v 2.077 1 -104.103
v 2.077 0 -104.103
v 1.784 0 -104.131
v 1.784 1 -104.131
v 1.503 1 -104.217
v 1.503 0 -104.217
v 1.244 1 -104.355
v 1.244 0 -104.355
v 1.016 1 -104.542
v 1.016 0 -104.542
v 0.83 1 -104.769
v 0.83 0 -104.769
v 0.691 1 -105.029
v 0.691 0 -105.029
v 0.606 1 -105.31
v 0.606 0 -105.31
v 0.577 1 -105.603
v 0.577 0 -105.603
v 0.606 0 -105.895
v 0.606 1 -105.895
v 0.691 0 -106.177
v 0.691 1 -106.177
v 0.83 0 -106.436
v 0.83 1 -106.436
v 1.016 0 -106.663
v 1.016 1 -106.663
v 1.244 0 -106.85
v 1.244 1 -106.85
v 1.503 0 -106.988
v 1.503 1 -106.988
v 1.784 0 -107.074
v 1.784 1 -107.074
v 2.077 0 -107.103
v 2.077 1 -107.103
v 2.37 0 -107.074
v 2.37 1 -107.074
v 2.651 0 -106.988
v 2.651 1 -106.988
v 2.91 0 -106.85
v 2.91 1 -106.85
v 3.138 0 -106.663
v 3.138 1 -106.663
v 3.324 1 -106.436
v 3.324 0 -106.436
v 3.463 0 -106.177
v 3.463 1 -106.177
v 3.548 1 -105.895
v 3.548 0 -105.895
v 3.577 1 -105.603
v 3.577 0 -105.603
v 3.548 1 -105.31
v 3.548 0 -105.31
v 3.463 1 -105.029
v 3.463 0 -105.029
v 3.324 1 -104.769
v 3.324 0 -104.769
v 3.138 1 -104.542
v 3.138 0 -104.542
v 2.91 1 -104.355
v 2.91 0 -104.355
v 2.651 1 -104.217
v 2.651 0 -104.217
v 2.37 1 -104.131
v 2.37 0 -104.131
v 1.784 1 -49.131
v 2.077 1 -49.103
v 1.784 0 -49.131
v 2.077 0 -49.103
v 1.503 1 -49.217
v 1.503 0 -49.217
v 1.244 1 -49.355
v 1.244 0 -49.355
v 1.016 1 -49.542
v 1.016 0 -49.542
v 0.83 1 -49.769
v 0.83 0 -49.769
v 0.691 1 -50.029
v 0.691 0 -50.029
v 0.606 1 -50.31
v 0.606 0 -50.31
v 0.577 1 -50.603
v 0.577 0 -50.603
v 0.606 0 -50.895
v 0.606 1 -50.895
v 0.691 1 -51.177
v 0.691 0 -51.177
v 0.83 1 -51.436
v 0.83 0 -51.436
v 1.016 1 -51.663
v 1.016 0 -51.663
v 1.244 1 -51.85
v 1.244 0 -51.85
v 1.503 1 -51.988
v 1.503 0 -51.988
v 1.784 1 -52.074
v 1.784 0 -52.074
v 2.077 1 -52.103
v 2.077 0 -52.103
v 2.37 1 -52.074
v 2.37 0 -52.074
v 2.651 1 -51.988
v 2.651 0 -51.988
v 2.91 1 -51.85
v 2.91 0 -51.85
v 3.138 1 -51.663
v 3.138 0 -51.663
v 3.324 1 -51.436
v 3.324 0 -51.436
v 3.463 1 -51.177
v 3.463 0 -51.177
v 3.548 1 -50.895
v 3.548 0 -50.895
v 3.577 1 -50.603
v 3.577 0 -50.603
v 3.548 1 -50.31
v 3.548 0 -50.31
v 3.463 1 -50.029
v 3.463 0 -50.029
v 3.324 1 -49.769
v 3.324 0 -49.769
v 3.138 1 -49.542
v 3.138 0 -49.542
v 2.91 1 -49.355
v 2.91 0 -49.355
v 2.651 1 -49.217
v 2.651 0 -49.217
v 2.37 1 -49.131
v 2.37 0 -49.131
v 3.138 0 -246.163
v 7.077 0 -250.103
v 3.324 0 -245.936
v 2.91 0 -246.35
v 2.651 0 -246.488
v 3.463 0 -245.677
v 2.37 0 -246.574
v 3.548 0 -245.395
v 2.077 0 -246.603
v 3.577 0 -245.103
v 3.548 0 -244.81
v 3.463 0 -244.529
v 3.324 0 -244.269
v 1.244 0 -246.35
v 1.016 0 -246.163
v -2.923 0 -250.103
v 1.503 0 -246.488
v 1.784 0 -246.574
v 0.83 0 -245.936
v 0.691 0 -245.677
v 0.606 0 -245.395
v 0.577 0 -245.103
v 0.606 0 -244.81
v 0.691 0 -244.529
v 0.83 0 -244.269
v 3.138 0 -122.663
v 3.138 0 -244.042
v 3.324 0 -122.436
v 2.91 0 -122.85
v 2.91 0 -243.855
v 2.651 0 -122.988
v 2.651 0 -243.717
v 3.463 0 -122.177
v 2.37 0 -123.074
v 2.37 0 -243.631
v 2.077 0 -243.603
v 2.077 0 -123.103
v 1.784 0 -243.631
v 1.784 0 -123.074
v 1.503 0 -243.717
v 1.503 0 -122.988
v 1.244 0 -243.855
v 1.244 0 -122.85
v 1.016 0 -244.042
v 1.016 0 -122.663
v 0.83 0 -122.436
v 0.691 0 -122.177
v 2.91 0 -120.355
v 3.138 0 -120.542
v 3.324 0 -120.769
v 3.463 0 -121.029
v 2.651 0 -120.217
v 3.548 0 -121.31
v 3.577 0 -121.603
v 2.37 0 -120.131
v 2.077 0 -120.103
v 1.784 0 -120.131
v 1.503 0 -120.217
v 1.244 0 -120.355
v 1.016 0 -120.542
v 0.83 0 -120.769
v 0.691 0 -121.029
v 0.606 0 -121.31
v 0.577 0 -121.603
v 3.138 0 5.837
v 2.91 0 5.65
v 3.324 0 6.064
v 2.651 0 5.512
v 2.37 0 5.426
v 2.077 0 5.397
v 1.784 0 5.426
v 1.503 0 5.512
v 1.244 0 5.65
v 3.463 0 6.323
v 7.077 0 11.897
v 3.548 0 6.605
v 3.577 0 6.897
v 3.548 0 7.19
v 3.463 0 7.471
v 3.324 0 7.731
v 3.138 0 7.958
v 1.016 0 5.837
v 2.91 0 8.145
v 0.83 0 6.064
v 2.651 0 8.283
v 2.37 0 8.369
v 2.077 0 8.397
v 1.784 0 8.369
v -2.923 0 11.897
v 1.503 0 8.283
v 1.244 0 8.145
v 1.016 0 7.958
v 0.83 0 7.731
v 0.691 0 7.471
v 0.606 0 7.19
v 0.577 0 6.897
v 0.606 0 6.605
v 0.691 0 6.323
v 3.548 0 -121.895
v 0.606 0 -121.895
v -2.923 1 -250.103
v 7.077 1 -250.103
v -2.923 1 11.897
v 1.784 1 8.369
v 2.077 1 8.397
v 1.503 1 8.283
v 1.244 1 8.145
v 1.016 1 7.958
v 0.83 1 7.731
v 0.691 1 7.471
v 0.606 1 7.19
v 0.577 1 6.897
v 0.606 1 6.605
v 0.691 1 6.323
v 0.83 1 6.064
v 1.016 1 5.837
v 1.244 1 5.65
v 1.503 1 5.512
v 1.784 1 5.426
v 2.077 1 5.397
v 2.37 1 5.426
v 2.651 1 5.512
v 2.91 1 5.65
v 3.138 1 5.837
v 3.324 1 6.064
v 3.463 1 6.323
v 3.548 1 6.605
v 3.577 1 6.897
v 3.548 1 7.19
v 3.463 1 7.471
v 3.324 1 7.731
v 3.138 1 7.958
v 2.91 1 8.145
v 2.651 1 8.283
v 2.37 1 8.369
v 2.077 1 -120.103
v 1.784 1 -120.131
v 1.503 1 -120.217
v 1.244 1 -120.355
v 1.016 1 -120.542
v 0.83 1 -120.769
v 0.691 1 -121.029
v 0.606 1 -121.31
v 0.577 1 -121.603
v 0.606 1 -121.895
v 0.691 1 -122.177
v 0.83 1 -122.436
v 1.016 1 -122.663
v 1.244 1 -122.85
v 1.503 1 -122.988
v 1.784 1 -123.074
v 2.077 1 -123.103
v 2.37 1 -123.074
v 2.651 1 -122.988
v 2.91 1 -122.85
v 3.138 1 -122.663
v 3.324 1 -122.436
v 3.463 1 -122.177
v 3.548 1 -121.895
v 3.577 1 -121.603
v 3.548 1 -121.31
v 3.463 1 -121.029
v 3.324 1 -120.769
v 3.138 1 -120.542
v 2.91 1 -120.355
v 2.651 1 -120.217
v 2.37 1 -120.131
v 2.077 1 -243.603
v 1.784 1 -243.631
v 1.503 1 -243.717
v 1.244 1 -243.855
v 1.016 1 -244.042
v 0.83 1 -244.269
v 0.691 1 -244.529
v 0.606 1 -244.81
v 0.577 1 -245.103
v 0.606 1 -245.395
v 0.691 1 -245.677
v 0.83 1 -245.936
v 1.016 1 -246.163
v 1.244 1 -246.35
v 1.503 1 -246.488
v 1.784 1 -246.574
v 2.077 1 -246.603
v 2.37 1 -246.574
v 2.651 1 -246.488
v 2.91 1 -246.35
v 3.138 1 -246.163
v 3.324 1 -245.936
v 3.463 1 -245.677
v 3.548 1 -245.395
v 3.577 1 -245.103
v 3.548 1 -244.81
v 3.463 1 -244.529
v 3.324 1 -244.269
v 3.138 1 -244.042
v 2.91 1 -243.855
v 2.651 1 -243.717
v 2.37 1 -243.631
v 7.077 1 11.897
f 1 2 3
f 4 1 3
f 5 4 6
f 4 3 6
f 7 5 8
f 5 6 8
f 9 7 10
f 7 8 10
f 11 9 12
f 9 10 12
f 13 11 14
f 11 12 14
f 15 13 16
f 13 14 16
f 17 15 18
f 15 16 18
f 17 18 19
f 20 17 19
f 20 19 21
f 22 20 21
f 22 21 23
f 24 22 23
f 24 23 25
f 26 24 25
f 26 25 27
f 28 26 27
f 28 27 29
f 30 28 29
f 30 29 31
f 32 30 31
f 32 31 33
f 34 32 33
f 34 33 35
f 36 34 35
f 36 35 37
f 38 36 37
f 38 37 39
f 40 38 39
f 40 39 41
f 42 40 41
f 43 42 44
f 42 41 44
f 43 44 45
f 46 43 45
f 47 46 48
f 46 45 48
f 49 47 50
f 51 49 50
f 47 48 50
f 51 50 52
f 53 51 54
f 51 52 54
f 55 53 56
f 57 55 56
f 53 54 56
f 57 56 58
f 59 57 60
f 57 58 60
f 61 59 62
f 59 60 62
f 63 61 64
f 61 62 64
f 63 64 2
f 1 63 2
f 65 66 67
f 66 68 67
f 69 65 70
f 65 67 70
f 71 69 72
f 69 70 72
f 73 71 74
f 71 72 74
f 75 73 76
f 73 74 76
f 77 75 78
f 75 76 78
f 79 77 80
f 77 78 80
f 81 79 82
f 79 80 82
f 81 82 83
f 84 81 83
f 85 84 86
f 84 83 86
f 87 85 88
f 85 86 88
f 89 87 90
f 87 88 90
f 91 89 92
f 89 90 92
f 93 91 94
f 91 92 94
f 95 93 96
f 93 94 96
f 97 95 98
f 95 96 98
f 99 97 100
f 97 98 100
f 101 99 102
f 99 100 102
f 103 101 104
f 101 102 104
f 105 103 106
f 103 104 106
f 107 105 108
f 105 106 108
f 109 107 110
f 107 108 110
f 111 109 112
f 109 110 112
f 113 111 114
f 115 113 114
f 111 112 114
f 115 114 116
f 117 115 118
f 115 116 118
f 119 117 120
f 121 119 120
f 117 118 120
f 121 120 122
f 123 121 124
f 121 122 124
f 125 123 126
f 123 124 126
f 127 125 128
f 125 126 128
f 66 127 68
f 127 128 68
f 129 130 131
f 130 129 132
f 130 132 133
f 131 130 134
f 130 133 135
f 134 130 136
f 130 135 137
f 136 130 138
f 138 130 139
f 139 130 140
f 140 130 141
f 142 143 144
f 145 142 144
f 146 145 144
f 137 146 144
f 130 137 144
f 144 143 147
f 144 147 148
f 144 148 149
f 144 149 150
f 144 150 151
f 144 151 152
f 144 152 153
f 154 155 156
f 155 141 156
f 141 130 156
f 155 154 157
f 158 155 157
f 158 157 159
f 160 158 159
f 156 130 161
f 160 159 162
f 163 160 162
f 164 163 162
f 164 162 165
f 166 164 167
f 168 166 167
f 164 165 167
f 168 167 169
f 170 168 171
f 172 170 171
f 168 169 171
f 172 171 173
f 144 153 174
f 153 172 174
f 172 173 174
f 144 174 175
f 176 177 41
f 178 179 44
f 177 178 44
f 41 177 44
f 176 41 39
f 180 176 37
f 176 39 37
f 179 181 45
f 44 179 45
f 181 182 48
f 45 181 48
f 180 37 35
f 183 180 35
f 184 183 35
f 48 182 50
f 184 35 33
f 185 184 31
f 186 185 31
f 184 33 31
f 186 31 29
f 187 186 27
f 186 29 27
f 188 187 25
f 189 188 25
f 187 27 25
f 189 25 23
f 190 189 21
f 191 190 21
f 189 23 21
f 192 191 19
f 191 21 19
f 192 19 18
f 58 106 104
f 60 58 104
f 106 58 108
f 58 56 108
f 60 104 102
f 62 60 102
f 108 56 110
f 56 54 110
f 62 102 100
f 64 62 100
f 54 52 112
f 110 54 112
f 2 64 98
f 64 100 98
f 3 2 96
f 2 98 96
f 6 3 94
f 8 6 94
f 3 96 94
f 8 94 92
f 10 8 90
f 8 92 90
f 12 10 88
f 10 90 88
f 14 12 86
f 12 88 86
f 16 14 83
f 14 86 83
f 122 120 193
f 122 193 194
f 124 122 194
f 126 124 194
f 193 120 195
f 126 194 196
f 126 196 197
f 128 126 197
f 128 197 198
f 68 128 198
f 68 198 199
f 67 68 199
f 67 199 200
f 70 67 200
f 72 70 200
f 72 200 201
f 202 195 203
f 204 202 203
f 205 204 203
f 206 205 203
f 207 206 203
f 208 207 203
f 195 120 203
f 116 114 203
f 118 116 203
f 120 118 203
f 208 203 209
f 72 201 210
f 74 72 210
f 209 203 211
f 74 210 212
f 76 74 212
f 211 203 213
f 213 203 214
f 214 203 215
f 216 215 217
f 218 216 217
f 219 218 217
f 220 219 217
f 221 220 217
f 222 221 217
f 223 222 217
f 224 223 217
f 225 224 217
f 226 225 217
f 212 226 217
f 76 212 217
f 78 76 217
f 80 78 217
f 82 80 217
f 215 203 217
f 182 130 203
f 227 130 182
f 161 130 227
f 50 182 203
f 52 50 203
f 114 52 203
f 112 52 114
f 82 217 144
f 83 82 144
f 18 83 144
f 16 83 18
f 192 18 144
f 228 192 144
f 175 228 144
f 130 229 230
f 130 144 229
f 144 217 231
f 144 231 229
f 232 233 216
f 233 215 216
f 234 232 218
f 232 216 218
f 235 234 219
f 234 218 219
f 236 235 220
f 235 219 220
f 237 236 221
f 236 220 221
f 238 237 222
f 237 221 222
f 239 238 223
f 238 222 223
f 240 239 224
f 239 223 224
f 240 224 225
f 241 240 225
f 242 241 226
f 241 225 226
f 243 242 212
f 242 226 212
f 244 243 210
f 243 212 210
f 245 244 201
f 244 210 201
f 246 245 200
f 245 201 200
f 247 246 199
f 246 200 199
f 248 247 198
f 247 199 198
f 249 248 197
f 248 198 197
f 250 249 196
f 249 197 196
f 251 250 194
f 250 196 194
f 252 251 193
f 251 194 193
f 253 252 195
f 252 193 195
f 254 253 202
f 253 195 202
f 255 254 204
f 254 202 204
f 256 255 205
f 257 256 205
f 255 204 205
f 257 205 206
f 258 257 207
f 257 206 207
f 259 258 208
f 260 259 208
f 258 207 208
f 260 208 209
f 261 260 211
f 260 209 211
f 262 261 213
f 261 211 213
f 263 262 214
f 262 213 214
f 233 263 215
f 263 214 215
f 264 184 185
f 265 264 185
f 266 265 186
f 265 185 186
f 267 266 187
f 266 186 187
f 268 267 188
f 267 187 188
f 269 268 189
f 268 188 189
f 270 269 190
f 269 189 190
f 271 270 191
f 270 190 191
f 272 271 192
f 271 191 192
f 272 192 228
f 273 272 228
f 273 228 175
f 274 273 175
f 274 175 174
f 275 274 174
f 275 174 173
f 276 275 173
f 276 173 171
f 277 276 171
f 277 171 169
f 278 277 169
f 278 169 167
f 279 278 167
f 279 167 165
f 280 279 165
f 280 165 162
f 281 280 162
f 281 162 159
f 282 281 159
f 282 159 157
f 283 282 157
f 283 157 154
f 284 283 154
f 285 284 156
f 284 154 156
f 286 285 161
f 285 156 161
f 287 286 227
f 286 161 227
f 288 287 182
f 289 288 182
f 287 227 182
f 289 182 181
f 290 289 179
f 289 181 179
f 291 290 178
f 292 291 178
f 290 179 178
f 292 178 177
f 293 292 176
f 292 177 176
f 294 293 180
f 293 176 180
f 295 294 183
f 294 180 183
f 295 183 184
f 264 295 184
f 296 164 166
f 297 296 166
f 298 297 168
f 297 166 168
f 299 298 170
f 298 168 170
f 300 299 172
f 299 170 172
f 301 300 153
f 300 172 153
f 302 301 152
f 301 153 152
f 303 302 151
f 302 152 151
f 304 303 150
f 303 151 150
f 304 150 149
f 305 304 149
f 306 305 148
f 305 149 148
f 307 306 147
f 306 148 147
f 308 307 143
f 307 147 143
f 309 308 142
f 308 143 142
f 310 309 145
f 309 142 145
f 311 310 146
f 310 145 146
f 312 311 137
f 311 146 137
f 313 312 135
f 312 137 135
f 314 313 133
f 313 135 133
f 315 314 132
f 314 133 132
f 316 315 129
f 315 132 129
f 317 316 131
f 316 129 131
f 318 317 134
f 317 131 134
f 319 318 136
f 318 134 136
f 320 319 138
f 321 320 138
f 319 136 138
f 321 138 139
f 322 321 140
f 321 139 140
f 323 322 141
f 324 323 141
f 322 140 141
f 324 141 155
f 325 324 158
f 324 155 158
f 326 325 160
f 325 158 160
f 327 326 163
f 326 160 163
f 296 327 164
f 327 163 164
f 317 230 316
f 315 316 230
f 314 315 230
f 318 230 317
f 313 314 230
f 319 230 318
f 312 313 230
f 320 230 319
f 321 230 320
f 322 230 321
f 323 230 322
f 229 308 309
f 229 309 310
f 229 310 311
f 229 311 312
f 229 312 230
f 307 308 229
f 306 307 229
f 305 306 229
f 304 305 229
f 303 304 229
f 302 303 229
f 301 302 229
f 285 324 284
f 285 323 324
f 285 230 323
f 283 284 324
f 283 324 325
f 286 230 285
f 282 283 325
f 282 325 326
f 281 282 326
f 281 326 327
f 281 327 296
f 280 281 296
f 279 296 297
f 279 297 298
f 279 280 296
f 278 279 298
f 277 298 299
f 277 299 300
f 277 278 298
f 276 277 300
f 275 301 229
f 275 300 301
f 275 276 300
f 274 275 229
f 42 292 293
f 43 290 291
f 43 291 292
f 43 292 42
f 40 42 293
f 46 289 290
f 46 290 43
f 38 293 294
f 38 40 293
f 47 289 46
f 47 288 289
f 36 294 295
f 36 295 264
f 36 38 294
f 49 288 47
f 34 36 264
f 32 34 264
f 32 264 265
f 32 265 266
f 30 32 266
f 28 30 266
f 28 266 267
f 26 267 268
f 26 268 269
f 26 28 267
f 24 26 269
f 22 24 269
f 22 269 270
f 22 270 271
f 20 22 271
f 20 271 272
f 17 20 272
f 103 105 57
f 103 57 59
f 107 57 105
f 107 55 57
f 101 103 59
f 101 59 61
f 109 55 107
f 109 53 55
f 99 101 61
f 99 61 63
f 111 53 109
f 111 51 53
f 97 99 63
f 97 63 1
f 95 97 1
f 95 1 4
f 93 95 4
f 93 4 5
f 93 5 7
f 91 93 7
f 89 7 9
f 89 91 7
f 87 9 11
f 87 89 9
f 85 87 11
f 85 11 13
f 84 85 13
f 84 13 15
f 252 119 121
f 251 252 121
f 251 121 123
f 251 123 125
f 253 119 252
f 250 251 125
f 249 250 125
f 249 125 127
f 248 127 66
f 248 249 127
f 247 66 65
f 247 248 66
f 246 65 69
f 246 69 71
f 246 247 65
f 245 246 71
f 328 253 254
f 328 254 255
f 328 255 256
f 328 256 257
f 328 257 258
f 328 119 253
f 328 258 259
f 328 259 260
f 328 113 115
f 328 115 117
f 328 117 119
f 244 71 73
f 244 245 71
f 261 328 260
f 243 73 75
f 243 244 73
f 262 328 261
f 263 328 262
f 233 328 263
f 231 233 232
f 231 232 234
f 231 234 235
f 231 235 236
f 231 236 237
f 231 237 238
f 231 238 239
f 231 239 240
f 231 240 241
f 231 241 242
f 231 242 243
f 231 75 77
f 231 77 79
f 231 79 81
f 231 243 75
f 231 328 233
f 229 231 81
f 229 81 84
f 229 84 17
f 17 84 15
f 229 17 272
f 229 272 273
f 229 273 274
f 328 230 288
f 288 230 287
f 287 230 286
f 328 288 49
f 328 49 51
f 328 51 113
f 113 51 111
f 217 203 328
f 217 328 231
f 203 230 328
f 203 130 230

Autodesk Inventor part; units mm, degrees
ref_plane "YZ Plane" through (0, 0, 0) normal (1, 0, 0) x (0, 1, 0)
ref_plane "XZ Plane" through (0, 0, 0) normal (0, 1, 0) x (-1, 0, 0)
ref_plane "XY Plane" through (0, 0, 0) normal (0, 0, 1) x (1, 0, 0)
sketch "Skizze1" plane through (0, 0, 0) normal (0, 1, 0) x (-1, 0, 0)
  line L0 (-7.0769, 11.8974) -> (2.9231, 11.8974)
  line L1 (2.9231, 11.8974) -> (2.9231, -250.1026)
  line L2 (2.9231, -250.1026) -> (-7.0769, -250.1026)
  line L3 (-7.0769, -250.1026) -> (-7.0769, 11.8974)
  point P0 (0, 0)
  dimension "d0" = 262
  dimension "d1" = 10
extrude "Extrusion1" add sketch "Skizze1" along normal blind 1
sketch "Skizze2" plane through (0, 1, 0) normal (0, 1, 0) x (1, 0, 0)
  line L0 (-2.9231, -11.8974) -> (7.0769, -11.8974) projected
  line L1 (7.0769, -11.8974) -> (7.0769, 250.1026) projected
  line L2 (7.0769, 250.1026) -> (-2.9231, 250.1026) projected
  point P0 (0, 0)
  point P1 (2.0769, -6.8974)
  point P2 (2.0769, 245.1026)
  dimension "d4" = 5
  dimension "d5" = 5
  dimension "d13" = 5
  dimension "d14" = 5
hole "Bohrung1" at (2.0769, 1, 6.8974) direction (0, -1, 0) diameter 3 end through all
sketch "Skizze3" plane through (0, 1, 0) normal (0, 1, 0) x (1, 0, 0)
  line L0 (7.0769, 250.1026) -> (-2.9231, 250.1026) projected
  line L1 (7.0769, -11.8974) -> (7.0769, 250.1026) projected
  point P0 (0, 0)
  point P1 (2.0769, 245.1026)
  dimension "d15" = 5
  dimension "d16" = 5
hole "Bohrung2" at (2.0769, 1, -245.1026) direction (0, -1, 0) diameter 3 end through all
sketch "Skizze4" plane through (0, 1, 0) normal (0, 1, 0) x (1, 0, 0)
  line L0 (-2.9231, -11.8974) -> (7.0769, -11.8974) projected
  line L1 (7.0769, -11.8974) -> (7.0769, 250.1026) projected
  line L2 (7.0769, 250.1026) -> (-2.9231, 250.1026) projected
  point P0 (0, 0)
  point P1 (2.0769, 121.6026)
  dimension "d25" = 5
  dimension "d33" = 128.5
hole "Bohrung3" at (2.0769, 1, -121.6026) direction (0, -1, 0) diameter 3 end through all
sketch "Skizze5" plane through (0, 1, 0) normal (0, 1, 0) x (1, 0, 0)
  line L0 (-2.9231, -11.8974) -> (7.0769, -11.8974) projected
  line L1 (7.0769, -11.8974) -> (7.0769, 250.1026) projected
  line L2 (7.0769, 250.1026) -> (-2.9231, 250.1026) projected
  point P0 (0, 0)
  point P1 (2.0769, 50.6026)
  point P2 (2.0769, 105.6026)
  dimension "d35" = 5
  dimension "d44" = 144.5
  dimension "d45" = 55
hole "Bohrung4" at (2.0769, 1, -50.6026) at (2.0769, 1, -105.6026) direction (0, -1, 0) diameter 3 end through all
properties part number "Rig" material "Aluminium 6061"
